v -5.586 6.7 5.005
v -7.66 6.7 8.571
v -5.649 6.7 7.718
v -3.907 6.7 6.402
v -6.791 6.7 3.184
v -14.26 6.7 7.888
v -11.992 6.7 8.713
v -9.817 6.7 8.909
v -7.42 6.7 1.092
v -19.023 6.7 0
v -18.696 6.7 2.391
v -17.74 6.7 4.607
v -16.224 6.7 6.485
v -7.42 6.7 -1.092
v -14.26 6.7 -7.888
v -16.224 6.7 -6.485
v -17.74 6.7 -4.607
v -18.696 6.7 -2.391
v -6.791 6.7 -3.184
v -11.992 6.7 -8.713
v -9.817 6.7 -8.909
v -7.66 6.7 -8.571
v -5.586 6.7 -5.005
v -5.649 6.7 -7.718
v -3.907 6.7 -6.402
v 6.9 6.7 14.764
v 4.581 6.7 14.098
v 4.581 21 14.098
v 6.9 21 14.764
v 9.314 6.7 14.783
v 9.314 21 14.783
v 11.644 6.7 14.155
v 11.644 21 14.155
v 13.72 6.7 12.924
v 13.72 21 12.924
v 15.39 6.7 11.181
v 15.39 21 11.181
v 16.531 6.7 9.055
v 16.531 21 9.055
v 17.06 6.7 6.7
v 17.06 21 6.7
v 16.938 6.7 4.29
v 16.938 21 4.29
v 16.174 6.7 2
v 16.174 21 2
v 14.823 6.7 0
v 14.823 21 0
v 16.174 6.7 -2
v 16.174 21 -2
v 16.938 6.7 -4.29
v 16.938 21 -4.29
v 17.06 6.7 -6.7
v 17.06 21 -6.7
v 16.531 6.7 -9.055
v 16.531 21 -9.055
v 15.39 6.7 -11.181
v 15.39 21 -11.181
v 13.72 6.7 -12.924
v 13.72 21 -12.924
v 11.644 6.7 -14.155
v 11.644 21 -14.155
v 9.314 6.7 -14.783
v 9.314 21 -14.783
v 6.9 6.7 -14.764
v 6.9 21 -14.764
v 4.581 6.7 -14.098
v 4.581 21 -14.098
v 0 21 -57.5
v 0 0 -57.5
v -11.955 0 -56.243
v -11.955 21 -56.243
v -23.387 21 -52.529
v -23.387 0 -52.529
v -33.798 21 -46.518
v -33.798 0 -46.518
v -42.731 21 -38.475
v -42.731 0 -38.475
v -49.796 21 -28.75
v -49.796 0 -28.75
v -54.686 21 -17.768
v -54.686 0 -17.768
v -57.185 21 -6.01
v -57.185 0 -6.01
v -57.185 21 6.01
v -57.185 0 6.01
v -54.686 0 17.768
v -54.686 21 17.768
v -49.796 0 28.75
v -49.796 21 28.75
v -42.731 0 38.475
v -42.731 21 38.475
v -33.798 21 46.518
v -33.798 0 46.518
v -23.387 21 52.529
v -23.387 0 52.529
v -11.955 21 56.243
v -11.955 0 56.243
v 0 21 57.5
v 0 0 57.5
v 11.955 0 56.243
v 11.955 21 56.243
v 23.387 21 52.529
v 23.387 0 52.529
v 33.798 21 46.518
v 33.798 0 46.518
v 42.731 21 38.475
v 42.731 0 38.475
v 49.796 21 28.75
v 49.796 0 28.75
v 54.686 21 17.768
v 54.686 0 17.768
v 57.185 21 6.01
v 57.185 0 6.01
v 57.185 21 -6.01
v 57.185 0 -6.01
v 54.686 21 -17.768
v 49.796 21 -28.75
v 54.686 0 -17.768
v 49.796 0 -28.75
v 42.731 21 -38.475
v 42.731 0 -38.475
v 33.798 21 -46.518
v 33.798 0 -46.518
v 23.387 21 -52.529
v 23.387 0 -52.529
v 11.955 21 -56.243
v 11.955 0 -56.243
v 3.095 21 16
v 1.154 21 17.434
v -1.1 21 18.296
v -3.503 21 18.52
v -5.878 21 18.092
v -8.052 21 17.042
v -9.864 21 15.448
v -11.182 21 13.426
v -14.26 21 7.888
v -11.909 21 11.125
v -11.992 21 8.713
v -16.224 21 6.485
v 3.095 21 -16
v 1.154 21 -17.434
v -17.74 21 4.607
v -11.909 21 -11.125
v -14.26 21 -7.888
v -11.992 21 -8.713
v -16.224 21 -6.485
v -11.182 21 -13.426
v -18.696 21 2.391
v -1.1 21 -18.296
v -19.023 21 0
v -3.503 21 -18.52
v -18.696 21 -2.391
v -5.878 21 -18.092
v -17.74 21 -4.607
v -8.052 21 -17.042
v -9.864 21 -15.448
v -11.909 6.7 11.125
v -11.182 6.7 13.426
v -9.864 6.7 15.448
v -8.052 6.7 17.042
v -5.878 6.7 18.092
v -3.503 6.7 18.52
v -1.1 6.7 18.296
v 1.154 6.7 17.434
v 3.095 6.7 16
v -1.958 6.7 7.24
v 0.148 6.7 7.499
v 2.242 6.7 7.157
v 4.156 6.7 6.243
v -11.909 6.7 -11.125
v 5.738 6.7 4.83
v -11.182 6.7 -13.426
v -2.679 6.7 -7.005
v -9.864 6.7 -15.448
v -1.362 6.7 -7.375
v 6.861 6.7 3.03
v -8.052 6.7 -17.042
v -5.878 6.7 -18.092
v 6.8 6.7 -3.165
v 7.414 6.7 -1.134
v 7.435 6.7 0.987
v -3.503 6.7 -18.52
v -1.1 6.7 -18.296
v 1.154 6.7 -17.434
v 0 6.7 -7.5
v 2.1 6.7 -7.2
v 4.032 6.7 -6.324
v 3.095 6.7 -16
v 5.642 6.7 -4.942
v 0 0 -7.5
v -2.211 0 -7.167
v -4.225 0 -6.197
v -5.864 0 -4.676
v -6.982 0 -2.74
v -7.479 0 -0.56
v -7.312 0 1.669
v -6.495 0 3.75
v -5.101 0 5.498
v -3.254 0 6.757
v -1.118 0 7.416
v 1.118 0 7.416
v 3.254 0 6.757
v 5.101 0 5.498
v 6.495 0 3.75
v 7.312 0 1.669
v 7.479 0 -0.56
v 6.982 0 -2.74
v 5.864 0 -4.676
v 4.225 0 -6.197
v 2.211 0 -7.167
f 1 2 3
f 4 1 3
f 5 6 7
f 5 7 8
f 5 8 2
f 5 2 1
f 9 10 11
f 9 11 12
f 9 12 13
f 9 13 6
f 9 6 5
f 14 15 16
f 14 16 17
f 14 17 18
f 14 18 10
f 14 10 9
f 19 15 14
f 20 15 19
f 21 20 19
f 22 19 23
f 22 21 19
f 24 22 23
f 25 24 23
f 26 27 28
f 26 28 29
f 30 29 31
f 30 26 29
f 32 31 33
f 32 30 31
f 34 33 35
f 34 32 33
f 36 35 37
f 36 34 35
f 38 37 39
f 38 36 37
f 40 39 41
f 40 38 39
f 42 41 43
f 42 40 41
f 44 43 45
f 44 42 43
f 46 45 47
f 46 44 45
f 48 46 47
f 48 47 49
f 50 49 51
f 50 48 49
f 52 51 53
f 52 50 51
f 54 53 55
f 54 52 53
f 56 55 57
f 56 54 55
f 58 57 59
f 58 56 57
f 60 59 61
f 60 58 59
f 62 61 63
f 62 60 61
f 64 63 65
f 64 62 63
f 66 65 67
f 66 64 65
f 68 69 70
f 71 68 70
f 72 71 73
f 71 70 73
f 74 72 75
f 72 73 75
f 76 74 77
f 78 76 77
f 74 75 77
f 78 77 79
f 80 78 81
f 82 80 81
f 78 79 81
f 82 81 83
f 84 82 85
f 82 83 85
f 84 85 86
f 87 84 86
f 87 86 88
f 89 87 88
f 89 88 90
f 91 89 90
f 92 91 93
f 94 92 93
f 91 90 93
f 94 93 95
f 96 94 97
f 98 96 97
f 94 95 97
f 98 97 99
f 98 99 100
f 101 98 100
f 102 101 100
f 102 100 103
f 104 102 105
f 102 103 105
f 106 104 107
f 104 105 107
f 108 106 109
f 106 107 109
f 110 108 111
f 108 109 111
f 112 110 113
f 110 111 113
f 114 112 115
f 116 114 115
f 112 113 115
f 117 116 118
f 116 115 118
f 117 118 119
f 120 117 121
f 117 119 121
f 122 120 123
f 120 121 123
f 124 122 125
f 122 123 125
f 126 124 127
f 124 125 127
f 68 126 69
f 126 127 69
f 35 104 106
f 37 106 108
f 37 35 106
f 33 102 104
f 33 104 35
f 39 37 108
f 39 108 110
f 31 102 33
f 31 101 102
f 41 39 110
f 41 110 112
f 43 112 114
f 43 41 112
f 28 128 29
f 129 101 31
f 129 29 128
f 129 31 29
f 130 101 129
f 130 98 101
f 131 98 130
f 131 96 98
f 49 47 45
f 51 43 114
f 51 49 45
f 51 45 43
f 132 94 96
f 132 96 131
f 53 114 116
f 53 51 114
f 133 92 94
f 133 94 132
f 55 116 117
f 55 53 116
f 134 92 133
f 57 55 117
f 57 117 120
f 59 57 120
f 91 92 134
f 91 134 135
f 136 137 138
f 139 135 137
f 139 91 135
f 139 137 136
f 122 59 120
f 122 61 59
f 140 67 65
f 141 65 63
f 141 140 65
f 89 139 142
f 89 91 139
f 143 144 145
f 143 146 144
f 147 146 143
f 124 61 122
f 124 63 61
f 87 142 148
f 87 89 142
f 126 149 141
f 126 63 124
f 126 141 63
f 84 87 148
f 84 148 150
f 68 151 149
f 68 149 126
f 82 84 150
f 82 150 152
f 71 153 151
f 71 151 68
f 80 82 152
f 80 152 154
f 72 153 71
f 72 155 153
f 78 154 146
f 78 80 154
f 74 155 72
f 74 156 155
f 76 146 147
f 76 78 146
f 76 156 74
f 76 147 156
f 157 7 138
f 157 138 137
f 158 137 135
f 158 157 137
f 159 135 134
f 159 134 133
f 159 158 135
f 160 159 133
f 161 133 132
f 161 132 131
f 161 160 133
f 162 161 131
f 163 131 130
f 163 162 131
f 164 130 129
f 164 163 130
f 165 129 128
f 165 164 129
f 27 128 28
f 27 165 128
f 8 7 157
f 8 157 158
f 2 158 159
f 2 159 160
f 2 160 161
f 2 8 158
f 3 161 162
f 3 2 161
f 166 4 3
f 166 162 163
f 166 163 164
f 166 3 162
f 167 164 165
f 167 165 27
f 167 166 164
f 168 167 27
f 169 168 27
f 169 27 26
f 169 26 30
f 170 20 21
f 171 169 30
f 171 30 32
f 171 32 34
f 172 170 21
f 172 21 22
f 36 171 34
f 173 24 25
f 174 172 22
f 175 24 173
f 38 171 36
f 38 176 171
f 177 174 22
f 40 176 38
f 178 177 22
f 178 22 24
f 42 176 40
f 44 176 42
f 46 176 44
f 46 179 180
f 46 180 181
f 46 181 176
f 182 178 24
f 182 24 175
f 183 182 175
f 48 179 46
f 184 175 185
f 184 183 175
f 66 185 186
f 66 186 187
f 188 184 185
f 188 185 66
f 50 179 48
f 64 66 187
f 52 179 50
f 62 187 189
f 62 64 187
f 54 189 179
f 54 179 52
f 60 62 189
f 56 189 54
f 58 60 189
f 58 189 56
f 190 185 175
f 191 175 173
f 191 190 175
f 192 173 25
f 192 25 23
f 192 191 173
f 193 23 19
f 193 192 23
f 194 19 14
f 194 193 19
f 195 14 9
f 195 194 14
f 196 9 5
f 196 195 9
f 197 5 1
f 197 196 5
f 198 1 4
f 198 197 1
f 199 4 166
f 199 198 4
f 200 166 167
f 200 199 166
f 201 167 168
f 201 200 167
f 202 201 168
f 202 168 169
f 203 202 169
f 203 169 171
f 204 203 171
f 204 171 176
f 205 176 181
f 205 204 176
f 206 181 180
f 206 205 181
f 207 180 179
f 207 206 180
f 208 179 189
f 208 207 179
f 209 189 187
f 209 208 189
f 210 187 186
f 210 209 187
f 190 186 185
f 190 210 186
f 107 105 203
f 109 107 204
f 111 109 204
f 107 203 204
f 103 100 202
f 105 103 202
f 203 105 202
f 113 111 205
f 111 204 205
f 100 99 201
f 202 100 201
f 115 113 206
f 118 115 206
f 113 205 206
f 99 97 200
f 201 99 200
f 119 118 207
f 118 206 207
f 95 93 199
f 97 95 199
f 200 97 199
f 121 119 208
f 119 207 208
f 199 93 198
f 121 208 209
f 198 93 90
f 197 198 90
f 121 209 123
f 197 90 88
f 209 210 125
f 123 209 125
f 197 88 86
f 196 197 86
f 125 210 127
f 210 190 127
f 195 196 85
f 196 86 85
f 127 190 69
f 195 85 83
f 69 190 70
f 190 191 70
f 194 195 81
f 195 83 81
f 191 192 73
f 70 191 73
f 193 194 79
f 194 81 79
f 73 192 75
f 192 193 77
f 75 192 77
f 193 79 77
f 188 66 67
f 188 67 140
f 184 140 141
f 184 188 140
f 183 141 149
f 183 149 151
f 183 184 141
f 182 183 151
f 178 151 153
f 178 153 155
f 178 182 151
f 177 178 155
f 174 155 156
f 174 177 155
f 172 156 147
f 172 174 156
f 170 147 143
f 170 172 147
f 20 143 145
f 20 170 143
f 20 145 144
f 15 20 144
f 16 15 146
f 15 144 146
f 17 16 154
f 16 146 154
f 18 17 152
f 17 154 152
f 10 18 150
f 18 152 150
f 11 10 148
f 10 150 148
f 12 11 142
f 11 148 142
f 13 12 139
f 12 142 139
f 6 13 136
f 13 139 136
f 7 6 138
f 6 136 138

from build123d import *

# Parameters (mm, degrees)
SKETCH1_R           = 57.5
BOSS_EXTRUDE1_DEPTH = 21
SKETCH2_R           = 7.5
CUT_EXTRUDE1_DEPTH  = 84.985117729
SKETCH3_R           = 8.914028006
CUT_EXTRUDE2_DEPTH  = 14.300030393
CIRPATTERN1_COUNT   = 5


with BuildPart() as part:
    # Sketch1 → Boss-Extrude1 (new body)
    with BuildSketch(Plane(origin=(0, 0, 0), x_dir=(1, 0, 0), z_dir=(0, 1, 0))):
        Circle(SKETCH1_R)
    extrude(amount=BOSS_EXTRUDE1_DEPTH)

    # Sketch2 → Cut-Extrude1 (cut, through all)
    with BuildSketch(Plane(origin=(0, 0, 0), x_dir=(1, 0, 0), z_dir=(0, 1, 0))):
        Circle(SKETCH2_R)
    extrude(amount=CUT_EXTRUDE1_DEPTH, mode=Mode.SUBTRACT)

    # Sketch3 → Cut-Extrude2 (cut)
    with BuildSketch(Plane(origin=(0, 21, 0), x_dir=(1, 0, 0), z_dir=(0, 1, 0))):
        with Locations((-10.109024176, 0)):
            Circle(SKETCH3_R)
    cut_extrude2 = extrude(amount=-CUT_EXTRUDE2_DEPTH, mode=Mode.SUBTRACT)

    # CirPattern1: Cut-Extrude2 ×5 about axis
    cirpattern1_axis = Axis((0, 0, 0), (0, 1, 0))
    for i in range(1, CIRPATTERN1_COUNT):
        add(cut_extrude2.rotate(cirpattern1_axis, i * 360 / CIRPATTERN1_COUNT), mode=Mode.SUBTRACT)


solid = part.part
